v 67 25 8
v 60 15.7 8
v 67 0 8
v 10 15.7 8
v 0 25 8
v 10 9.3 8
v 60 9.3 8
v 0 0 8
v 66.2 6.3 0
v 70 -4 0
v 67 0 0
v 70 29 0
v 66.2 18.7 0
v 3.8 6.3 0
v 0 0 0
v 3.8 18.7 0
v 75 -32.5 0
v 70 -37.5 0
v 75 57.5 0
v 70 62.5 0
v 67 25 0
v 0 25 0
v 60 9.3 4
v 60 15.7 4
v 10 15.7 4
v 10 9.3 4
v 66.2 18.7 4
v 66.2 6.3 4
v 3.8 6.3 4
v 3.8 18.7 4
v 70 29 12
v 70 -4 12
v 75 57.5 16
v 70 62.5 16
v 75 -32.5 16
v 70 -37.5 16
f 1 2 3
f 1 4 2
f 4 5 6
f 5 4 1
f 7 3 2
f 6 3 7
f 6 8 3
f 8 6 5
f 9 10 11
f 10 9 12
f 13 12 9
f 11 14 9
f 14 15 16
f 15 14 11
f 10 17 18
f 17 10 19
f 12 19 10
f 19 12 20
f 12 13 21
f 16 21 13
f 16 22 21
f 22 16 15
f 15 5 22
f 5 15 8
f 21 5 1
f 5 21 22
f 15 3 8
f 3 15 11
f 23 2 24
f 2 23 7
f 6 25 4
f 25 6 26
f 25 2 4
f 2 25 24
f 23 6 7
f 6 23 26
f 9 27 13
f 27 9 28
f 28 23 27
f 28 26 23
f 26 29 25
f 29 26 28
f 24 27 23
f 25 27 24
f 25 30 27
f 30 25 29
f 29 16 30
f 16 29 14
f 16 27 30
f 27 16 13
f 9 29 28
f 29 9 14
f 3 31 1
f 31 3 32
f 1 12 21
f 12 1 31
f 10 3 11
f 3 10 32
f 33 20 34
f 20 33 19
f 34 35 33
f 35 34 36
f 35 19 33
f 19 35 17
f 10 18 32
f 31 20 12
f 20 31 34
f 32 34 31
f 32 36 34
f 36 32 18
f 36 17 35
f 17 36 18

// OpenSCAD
//
// Design by: MrFuzzy 
// License: CC BY-NC 3.0
// Router support foot 
//  - Fits into guide holder of Makita RT0700 router
//  - Can be used with adapter for other routers (and brands) 
// 

// width of foot / guide holder opening
w = 25;

// length of foot
l = 70;

// foot: wall thickness
thn = 8;

// screw diameter: added 0.4 to adjust for printer cut-out precision. Adjust to cut-out precision of your printer
d_screw = 6.4;

// screw head diameter: 10mm (hex head), 12mm (Makita lock screw). Added 0.4 to adjust for printer cut-out precision. Set according to precision of your printe
d_screw_head = 12.4;

// thickness of screw head
thn_head = 4;

// length of shoe
l_shoe = 100;

// shoe thickness
thn_shoe = 5;


foot();
foot_base();
shoe();


module foot() {
    difference() {
        cube([l, w, thn]);
              
        translate([10, w/2-d_screw/2, 0])
            cube([l-20, d_screw, thn]); 

        translate([10-d_screw_head/2, w/2-d_screw_head/2, 0])
            cube([l-20+d_screw_head, d_screw_head, thn_head]); 
        
    }
}


module foot_base() {
    
    d_base = thn * 0.5;
    translate([l+1,-d_base,0])
    mirror([1,0,0]) {
        hull() {
            cube([1, w+d_base*2,thn+d_base]);
            translate([0,d_base,0])
                cube([d_base,w,thn]);
        }
    }
}

module shoe() {
    translate([0, w/2, 0])
    linear_extrude(thn*2)
    polygon(points = [[l, -l_shoe/2], [l, l_shoe/2], 
                      [l+thn_shoe, l_shoe/2-thn_shoe], [l+thn_shoe, -l_shoe/2+thn_shoe]]);
}
